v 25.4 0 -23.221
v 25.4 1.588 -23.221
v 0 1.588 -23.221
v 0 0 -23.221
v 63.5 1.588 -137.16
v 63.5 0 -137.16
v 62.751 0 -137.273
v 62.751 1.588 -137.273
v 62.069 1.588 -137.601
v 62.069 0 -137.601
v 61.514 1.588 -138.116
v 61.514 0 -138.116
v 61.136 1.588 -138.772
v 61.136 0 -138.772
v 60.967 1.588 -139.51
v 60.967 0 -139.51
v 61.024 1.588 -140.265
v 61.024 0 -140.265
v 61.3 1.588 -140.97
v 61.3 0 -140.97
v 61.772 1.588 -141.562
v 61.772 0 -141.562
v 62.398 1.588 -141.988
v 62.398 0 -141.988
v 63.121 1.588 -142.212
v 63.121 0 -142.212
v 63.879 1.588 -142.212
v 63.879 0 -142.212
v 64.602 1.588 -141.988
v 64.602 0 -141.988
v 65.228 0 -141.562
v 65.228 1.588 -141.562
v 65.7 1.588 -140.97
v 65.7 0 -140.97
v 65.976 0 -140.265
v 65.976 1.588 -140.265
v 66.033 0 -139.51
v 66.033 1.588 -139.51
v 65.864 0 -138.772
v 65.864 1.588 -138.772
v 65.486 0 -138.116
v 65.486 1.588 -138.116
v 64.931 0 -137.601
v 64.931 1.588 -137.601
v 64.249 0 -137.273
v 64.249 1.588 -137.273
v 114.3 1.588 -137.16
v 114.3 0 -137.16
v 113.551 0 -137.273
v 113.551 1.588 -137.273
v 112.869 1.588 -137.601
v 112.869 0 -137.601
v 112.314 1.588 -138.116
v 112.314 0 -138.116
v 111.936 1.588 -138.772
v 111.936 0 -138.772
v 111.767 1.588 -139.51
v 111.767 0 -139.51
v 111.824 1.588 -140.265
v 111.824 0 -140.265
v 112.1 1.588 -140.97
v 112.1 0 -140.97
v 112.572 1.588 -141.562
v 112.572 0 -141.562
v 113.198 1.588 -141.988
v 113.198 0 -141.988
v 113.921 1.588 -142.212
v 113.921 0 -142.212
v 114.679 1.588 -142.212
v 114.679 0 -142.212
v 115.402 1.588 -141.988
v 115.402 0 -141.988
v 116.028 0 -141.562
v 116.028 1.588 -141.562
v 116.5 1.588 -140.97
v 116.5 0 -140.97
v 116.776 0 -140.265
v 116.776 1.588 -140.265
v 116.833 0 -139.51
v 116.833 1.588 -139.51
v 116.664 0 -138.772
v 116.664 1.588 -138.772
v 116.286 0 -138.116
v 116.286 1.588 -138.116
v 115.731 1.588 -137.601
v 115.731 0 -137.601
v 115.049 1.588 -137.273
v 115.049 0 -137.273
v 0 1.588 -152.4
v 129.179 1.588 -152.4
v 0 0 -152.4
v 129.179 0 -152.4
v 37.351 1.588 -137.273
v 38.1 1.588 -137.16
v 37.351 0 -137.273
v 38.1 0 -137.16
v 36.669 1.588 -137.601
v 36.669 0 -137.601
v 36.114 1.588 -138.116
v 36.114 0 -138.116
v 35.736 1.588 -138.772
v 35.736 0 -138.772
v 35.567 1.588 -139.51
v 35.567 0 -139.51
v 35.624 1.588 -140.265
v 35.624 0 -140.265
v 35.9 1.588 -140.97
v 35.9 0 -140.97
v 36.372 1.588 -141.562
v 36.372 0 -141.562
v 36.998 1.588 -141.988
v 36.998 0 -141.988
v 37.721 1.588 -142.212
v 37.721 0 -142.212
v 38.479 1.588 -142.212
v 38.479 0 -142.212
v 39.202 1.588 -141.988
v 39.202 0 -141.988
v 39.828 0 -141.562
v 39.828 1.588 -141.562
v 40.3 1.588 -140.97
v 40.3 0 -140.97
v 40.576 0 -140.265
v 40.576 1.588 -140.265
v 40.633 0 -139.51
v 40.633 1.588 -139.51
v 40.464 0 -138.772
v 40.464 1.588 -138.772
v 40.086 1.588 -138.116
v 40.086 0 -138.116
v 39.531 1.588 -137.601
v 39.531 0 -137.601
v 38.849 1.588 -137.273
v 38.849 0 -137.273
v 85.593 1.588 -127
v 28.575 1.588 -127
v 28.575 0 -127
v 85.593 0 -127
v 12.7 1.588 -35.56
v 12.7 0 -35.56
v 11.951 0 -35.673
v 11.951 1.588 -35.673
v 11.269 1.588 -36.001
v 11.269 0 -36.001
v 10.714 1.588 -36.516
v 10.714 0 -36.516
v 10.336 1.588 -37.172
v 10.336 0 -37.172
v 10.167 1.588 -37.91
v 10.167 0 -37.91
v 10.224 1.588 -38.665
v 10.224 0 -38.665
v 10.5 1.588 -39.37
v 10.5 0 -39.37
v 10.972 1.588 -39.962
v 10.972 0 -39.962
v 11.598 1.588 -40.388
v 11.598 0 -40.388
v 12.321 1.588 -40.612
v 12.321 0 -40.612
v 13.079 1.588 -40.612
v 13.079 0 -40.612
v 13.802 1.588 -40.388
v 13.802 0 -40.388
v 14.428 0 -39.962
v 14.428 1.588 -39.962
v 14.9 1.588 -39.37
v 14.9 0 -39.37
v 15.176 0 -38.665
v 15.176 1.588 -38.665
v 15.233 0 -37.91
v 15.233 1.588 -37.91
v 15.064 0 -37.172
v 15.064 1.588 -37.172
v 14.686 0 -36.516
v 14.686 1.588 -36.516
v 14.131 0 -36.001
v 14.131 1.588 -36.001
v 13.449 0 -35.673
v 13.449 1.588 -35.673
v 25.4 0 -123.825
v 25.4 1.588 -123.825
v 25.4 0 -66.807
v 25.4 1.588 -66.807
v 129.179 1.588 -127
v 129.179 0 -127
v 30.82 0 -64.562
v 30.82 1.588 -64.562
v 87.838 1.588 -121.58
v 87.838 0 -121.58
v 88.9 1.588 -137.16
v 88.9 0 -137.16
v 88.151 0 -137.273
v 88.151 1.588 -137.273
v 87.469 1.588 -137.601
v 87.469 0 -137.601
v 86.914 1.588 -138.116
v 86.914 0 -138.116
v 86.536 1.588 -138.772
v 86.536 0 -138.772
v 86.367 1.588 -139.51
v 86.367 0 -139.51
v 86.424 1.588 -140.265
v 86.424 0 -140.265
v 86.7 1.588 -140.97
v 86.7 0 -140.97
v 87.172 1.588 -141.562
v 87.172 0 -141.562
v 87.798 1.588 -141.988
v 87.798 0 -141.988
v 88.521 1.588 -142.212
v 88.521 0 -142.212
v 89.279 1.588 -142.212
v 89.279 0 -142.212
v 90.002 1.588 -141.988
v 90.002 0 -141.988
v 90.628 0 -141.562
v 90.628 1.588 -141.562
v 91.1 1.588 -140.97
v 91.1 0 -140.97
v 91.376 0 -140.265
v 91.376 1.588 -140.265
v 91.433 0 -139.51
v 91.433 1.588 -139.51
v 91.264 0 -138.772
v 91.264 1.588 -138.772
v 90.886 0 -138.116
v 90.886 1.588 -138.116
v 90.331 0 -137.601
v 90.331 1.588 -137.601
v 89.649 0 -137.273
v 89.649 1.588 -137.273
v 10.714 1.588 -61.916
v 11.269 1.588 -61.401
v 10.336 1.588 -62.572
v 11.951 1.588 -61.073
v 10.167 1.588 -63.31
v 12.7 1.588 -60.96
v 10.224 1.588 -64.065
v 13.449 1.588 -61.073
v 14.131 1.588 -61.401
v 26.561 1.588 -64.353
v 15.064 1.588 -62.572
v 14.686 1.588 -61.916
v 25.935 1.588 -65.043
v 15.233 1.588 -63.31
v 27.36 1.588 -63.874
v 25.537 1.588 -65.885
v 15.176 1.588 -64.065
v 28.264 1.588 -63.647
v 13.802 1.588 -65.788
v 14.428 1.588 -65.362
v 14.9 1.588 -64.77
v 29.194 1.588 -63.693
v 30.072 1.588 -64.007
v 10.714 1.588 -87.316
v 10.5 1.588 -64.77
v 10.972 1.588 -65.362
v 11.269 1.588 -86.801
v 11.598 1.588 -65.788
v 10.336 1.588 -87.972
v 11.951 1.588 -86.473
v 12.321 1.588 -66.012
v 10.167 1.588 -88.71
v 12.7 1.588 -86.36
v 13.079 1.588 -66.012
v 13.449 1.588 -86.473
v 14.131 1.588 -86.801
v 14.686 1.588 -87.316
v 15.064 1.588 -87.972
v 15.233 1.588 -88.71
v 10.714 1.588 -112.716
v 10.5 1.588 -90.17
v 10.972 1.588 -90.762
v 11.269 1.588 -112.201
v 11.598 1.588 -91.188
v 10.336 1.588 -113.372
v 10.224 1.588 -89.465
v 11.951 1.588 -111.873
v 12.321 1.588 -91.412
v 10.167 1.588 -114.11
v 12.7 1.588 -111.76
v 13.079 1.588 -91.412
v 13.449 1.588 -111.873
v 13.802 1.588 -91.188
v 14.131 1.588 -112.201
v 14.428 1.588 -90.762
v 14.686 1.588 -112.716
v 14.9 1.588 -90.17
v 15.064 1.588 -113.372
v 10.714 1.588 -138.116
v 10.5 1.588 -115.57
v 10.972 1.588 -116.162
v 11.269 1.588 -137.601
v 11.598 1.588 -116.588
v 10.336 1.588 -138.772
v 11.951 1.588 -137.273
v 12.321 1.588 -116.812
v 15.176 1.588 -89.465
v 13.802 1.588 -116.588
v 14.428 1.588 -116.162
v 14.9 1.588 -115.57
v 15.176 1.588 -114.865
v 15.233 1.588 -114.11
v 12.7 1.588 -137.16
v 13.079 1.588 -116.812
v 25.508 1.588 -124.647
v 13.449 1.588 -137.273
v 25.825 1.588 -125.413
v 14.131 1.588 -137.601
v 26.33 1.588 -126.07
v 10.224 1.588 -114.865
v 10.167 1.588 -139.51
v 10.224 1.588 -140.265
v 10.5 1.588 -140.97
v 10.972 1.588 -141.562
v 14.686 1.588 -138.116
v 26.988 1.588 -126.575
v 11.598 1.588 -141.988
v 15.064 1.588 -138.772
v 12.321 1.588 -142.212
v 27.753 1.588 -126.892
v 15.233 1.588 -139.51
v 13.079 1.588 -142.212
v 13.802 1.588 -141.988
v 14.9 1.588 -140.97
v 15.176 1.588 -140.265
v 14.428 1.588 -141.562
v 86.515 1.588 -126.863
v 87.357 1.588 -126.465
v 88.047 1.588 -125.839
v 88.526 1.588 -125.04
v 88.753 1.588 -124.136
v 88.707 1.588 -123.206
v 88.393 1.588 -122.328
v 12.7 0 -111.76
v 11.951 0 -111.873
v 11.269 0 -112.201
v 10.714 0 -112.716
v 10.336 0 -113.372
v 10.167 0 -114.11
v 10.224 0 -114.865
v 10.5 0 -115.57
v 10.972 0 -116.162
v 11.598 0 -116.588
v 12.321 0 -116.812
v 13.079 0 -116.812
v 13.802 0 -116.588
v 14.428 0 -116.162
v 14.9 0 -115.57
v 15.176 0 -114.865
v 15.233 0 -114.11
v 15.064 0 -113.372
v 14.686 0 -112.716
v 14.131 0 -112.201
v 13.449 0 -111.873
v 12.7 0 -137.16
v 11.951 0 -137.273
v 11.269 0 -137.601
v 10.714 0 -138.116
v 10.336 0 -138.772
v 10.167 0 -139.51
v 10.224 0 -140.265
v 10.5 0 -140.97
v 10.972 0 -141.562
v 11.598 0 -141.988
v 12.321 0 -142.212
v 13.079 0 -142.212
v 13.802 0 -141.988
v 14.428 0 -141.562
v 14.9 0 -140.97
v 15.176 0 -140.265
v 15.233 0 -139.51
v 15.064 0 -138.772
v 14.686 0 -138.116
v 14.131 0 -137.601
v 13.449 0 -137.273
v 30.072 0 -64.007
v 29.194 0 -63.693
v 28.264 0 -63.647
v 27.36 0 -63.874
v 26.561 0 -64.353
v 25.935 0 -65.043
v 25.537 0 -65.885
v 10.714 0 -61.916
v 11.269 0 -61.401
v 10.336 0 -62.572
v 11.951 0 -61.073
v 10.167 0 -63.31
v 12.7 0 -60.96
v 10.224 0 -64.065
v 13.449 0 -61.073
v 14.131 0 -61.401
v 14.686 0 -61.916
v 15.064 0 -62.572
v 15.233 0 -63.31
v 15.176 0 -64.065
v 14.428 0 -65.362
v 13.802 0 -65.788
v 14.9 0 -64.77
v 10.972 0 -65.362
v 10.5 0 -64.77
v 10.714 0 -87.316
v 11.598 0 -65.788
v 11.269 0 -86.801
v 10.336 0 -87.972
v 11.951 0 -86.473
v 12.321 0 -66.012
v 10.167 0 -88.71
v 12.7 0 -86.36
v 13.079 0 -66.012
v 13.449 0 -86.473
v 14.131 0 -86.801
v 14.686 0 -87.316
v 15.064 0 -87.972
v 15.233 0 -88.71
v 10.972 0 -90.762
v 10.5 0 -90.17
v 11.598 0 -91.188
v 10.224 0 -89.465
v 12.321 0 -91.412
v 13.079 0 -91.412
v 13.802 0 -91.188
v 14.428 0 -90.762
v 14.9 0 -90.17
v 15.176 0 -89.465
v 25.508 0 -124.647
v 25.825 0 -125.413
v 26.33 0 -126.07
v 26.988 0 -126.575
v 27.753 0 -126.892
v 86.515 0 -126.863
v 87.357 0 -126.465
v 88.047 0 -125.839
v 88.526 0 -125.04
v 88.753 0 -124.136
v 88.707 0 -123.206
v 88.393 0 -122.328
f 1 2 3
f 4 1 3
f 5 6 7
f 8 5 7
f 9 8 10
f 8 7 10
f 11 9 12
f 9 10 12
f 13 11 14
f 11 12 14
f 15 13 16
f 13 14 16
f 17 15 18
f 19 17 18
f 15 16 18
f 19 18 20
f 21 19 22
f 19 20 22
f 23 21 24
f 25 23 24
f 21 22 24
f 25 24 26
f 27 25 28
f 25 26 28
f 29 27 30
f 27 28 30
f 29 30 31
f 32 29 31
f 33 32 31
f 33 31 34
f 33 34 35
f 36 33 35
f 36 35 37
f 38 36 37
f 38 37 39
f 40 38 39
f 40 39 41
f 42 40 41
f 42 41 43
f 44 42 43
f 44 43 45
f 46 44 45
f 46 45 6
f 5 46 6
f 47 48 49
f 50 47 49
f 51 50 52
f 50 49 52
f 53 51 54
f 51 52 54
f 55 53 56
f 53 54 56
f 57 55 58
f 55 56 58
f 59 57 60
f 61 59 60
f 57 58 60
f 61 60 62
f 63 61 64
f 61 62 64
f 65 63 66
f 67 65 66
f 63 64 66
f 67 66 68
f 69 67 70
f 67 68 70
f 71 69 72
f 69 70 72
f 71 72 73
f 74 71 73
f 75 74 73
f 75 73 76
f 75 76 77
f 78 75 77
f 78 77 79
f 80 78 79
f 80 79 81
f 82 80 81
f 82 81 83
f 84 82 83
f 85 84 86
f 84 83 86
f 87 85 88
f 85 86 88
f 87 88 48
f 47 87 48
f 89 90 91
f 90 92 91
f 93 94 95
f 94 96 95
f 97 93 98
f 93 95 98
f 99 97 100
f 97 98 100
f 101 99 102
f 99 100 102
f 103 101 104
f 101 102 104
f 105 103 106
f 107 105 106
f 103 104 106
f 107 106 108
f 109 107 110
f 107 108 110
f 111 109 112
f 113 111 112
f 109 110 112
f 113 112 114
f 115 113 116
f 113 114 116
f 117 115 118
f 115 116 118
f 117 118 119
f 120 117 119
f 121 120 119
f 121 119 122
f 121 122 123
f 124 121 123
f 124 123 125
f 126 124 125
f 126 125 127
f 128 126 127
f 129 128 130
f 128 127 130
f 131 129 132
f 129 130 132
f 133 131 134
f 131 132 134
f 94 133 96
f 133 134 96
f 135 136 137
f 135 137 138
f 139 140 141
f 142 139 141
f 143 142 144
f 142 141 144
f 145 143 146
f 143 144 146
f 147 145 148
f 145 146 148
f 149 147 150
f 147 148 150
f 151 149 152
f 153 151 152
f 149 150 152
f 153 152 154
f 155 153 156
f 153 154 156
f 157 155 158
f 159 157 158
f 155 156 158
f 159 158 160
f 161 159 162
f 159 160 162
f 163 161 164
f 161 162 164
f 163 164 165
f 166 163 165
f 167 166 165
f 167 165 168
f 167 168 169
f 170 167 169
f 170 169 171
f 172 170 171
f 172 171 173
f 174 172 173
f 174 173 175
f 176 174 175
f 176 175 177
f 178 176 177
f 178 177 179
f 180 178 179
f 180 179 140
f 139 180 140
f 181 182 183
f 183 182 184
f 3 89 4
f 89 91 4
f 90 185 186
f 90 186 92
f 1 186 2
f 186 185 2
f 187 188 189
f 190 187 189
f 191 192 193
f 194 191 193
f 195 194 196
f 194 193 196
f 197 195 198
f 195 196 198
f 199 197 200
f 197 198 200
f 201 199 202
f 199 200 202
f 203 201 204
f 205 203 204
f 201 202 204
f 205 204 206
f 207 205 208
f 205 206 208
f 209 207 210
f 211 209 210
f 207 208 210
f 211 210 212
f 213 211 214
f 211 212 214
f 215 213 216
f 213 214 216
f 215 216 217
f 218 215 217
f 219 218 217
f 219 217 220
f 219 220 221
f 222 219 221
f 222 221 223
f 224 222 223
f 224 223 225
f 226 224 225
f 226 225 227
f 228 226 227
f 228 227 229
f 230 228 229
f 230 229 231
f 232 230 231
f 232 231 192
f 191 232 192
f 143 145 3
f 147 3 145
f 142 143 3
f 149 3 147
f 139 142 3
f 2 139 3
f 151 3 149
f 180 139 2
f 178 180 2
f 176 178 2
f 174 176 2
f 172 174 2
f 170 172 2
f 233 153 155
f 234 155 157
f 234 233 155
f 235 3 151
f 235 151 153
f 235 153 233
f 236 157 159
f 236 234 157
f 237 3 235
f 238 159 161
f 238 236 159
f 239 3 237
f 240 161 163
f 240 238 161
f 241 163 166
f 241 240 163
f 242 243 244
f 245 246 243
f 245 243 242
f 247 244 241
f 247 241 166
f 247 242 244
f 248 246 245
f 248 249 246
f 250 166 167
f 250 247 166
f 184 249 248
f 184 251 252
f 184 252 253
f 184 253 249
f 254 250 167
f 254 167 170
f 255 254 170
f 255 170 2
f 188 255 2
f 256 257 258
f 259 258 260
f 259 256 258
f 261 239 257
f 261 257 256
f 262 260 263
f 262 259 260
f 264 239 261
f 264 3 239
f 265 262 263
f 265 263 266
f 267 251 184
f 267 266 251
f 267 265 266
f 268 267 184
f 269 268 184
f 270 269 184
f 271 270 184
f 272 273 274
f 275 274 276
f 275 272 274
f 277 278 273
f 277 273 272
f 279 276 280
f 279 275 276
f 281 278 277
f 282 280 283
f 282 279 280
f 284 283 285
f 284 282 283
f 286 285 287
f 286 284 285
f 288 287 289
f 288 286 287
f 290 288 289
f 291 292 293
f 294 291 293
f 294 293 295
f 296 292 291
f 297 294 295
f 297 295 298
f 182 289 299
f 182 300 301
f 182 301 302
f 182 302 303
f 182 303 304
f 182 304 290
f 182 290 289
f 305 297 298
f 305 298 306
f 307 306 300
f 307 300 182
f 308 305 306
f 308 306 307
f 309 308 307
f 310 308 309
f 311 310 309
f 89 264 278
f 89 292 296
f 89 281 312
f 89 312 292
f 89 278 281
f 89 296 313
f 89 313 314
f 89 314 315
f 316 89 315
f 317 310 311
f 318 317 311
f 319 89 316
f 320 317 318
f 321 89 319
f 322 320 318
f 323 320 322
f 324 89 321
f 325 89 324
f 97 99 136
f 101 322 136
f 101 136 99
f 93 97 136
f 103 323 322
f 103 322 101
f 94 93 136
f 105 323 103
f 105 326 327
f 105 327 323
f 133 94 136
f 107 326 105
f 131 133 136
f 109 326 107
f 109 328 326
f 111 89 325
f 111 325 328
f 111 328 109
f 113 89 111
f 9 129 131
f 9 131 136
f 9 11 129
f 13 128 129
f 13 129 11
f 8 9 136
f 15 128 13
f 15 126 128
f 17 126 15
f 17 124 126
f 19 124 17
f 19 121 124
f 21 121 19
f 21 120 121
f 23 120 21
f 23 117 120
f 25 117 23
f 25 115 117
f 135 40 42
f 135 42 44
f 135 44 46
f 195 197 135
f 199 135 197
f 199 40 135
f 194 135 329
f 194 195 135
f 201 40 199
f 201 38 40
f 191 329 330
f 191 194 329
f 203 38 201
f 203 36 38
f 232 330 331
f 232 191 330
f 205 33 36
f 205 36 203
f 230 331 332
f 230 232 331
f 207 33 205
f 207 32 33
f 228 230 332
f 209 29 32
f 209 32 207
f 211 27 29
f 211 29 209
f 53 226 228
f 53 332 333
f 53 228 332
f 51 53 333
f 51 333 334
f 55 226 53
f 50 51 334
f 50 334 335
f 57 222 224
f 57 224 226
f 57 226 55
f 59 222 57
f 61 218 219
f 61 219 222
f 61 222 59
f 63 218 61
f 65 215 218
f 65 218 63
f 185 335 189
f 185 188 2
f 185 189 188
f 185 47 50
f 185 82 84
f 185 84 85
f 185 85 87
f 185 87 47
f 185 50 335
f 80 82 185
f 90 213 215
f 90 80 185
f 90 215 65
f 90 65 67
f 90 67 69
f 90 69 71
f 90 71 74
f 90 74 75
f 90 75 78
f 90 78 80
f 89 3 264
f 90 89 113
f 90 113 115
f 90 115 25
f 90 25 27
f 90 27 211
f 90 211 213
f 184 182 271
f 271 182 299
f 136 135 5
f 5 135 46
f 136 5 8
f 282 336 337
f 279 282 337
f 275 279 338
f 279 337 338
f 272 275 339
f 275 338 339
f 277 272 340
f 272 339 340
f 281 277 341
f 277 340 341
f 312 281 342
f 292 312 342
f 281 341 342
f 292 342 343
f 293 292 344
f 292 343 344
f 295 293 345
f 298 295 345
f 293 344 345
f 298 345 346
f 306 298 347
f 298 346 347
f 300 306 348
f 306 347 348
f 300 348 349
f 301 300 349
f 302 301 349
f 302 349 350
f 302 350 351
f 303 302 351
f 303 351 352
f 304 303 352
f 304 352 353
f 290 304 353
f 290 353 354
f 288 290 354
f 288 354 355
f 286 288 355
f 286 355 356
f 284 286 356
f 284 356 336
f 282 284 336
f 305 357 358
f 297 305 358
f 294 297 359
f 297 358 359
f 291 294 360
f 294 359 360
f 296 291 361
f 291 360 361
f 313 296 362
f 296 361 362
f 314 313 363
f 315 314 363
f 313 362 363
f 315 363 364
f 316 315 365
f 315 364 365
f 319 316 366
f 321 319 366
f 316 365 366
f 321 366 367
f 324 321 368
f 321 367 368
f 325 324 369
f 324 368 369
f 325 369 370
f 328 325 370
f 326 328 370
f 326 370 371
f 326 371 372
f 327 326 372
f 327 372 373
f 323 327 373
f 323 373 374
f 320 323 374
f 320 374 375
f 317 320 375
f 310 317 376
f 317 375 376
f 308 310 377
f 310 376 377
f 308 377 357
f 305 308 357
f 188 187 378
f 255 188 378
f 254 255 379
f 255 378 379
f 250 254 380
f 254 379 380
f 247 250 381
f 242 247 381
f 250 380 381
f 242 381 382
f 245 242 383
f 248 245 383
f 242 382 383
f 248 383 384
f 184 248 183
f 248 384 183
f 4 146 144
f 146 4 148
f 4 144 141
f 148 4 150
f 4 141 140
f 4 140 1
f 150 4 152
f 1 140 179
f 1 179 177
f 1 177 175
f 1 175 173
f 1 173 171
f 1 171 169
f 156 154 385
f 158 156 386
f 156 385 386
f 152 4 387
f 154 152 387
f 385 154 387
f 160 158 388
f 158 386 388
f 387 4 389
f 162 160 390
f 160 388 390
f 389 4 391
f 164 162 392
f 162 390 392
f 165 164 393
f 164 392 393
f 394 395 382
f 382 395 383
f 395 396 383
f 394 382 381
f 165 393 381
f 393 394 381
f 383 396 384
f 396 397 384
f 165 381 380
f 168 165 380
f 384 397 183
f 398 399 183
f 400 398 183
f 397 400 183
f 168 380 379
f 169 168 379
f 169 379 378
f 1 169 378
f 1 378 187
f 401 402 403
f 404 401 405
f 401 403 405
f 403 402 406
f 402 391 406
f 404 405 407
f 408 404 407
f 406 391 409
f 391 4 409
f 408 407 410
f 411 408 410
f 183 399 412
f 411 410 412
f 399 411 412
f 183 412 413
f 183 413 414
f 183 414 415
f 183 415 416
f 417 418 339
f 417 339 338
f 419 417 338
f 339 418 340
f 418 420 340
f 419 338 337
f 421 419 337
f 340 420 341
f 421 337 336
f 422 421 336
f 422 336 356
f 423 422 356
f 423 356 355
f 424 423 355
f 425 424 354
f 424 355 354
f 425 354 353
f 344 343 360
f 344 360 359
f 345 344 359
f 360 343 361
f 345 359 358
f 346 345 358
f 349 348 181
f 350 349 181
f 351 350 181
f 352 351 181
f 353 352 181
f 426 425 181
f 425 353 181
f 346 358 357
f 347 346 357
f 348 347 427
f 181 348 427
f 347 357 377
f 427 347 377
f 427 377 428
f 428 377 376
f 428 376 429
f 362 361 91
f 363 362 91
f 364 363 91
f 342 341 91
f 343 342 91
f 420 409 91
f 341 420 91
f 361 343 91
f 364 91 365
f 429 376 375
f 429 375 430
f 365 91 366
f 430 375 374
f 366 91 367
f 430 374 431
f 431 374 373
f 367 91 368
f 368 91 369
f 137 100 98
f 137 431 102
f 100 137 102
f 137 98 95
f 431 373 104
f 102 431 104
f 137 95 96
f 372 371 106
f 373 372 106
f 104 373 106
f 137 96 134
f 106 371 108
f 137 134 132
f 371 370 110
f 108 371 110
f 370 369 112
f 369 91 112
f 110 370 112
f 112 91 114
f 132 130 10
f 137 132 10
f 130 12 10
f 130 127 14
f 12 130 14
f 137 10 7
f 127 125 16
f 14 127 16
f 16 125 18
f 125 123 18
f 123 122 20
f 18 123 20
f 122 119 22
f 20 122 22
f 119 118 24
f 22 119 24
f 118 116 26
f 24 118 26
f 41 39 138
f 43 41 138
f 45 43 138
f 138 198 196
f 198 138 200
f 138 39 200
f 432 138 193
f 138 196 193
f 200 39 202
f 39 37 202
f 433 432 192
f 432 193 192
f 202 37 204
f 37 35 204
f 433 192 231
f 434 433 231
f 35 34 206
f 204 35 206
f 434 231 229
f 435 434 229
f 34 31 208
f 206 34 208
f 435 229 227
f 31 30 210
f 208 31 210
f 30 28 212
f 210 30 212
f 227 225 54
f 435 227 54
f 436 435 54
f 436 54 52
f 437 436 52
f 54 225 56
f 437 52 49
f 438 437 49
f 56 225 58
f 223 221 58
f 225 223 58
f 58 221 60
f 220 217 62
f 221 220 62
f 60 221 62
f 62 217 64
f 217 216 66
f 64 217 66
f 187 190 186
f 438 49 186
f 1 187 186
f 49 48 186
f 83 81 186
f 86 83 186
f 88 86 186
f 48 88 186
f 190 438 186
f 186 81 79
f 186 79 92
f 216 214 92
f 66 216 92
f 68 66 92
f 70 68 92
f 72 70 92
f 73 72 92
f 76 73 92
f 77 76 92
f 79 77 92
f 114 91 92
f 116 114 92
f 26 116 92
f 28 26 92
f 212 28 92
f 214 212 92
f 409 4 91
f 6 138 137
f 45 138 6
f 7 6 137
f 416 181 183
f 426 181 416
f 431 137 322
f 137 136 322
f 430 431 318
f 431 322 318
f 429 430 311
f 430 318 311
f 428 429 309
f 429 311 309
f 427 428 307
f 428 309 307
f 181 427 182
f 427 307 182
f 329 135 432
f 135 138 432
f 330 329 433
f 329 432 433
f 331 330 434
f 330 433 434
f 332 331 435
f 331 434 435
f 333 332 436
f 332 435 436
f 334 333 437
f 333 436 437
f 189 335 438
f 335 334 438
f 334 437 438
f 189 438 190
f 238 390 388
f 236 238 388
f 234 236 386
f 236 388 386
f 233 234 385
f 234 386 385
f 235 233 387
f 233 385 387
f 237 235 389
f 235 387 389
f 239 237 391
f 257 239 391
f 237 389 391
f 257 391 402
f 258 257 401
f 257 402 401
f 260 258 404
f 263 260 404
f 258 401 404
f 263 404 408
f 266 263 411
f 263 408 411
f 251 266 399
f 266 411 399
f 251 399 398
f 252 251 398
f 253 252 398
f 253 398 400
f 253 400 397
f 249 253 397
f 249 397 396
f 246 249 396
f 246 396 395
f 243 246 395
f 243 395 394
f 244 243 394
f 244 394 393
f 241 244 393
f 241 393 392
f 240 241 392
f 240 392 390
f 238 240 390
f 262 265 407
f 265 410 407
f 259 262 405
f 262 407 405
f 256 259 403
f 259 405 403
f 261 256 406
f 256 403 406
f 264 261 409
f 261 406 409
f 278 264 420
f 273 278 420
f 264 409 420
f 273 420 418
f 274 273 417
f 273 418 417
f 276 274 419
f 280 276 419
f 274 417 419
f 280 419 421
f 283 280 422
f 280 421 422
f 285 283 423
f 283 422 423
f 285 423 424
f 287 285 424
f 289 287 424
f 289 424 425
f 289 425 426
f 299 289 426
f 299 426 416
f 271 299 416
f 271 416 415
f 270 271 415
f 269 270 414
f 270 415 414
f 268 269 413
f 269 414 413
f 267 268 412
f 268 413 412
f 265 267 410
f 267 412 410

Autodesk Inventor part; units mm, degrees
ref_plane "YZ Plane" through (0, 0, 0) normal (1, 0, 0) x (0, 1, 0)
ref_plane "XZ Plane" through (0, 0, 0) normal (0, 1, 0) x (-1, 0, 0)
ref_plane "XY Plane" through (0, 0, 0) normal (0, 0, 1) x (1, 0, 0)
sketch "Sketch1" plane through (0, 0, 0) normal (0, 1, 0) x (-1, 0, 0)
  line L0 (0, 0) -> (-25.4, 0)
  line L1 (-25.4, -35.921) -> (-25.4, -127)
  line L2 (-25.4, -152.4) -> (0, -152.4)
  line L3 (0, -152.4) -> (0, 0)
  line L4 (0, -152.4) -> (-152.4, -152.4)
  line L5 (-152.4, -152.4) -> (-152.4, -127)
  line L6 (-116.479, -127) -> (-25.4, -127)
  line L7 (0, -127) -> (0, -152.4)
  line L8 (-152.4, -127) -> (-25.4, 0)
  line L9 (-25.4, -35.921) -> (-116.479, -127)
  dimension "d0" = 25.4
  dimension "d1" = 152.4
  dimension "d2" = 152.4
  dimension "d3" = 25.4
  dimension "d4" = 25.4
extrude "Extrusion1" add sketch "Sketch1" along normal blind 1.5875
sketch "Sketch2" plane through (0, 1.5875, 0) normal (0, 1, 0) x (1, 0, 0)
  line L0 (152.4, 152.4) -> (0, 152.4) projected
  line L1 (0, 152.4) -> (25.4, 152.4)
  line L2 (25.4, 35.921) -> (25.4, 127) projected
  line L3 (25.4, 152.4) -> (25.4, 127)
  line L4 (25.4, 127) -> (0, 152.4)
  line L5 (25.4, 152.4) -> (0, 127)
  line L6 (0, 152.4) -> (0, 0) projected
  line L7 (12.7, 139.7) -> (38.1, 139.7)
  line L8 (38.1, 139.7) -> (63.5, 139.7)
  line L9 (63.5, 139.7) -> (88.9, 139.7)
  line L10 (88.9, 139.7) -> (114.3, 139.7)
  line L11 (114.3, 139.7) -> (139.7, 139.7)
  line L12 (12.7, 139.7) -> (12.7, 114.3)
  line L13 (12.7, 114.3) -> (12.7, 88.9)
  line L14 (12.7, 88.9) -> (12.7, 63.5)
  line L15 (12.7, 63.5) -> (12.7, 38.1)
  line L16 (12.7, 38.1) -> (12.7, 12.7)
  circle A0 centre (12.7, 139.7) radius 2.54
  circle A1 centre (38.1, 139.7) radius 2.54
  circle A2 centre (63.5, 139.7) radius 2.54
  circle A3 centre (88.9, 139.7) radius 2.54
  circle A4 centre (114.3, 139.7) radius 2.54
  circle A5 centre (139.7, 139.7) radius 2.54
  circle A6 centre (12.7, 114.3) radius 2.54
  circle A7 centre (12.7, 88.9) radius 2.54
  circle A8 centre (12.7, 63.5) radius 2.54
  circle A9 centre (12.7, 38.1) radius 2.54
  circle A10 centre (12.7, 12.7) radius 2.54
  dimension "d7" = 25.4
  dimension "d8" = 25.4
  dimension "d9" = 25.4
  dimension "d10" = 25.4
  dimension "d11" = 25.4
  dimension "d12" = 25.4
  dimension "d13" = 25.4
  dimension "d14" = 25.4
  dimension "d15" = 25.4
  dimension "d16" = 25.4
  dimension "d17" = 5.08
  dimension "d18" = 5.08
  dimension "d19" = 5.08
  dimension "d20" = 5.08
  dimension "d21" = 5.08
  dimension "d22" = 5.08
  dimension "d23" = 5.08
  dimension "d24" = 5.08
hole "Hole1" at (12.7, 1.5875, -139.7) at (38.1, 1.5875, -139.7) at (63.5, 1.5875, -139.7) at (88.9, 1.5875, -139.7) at (114.3, 1.5875, -139.7) at (12.7, 1.5875, -114.3) at (12.7, 1.5875, -88.9) at (12.7, 1.5875, -63.5) at (12.7, 1.5875, -38.1) direction (0, -1, 0) diameter 5.08 end through all
sketch "Sketch3" plane through (0, 1.5875, 0) normal (0, 1, 0) x (1, 0, 0)
  line L0 (116.479, 127) -> (25.4, 127) projected
  line L1 (116.479, 127) -> (129.179, 127)
  line L2 (129.179, 127) -> (129.179, 152.4)
  line L3 (152.4, 152.4) -> (0, 152.4) projected
  line L4 (25.4, 35.921) -> (25.4, 127) projected
  line L5 (25.4, 35.921) -> (25.4, 23.221)
  line L6 (25.4, 23.221) -> (0, 23.221)
  line L7 (0, 23.221) -> (0, 0)
  line L8 (25.4, 0) -> (152.4, 127) projected
  line L9 (0, 0) -> (25.4, 0)
  line L10 (25.4, 0) -> (152.4, 127)
  line L11 (152.4, 127) -> (152.4, 152.4) projected
  line L12 (152.4, 127) -> (152.4, 152.4)
  line L13 (152.4, 152.4) -> (129.179, 152.4)
  line L14 (116.479, 127) -> (25.4, 35.921)
  dimension "d32" = 12.7
  dimension "d33" = 12.7
extrude "Extrusion2" cut sketch "Sketch3" against normal blind 1.5875 contours L1 L2 L3 L11 L8 L9 L7 L6 L5 L14
sketch "Sketch4" plane through (0, 1.5875, 0) normal (0, 1, 0) x (1, 0, 0)
  line L0 (129.179, 127) -> (25.4, 127) projected
  line L1 (129.179, 127) -> (25.4, 23.221)
  line L2 (25.4, 59.142) -> (93.258, 127)
  line L3 (25.4, 127) -> (25.4, 23.221) projected
  line L4 (25.4, 59.142) -> (25.4, 23.221)
  point P0 (0, 0)
  dimension "d36" = 25.4
extrude "Extrusion3" add sketch "Sketch4" against normal blind 1.5875 contours L1 L3 L2 L0
fillet "Fillet1" radius 3.175 3 edges at (25.4, 0.7937, -127) (93.258, 0.7937, -127) (25.4, 0.7937, -59.142)
properties part number "Gusset 2B"
